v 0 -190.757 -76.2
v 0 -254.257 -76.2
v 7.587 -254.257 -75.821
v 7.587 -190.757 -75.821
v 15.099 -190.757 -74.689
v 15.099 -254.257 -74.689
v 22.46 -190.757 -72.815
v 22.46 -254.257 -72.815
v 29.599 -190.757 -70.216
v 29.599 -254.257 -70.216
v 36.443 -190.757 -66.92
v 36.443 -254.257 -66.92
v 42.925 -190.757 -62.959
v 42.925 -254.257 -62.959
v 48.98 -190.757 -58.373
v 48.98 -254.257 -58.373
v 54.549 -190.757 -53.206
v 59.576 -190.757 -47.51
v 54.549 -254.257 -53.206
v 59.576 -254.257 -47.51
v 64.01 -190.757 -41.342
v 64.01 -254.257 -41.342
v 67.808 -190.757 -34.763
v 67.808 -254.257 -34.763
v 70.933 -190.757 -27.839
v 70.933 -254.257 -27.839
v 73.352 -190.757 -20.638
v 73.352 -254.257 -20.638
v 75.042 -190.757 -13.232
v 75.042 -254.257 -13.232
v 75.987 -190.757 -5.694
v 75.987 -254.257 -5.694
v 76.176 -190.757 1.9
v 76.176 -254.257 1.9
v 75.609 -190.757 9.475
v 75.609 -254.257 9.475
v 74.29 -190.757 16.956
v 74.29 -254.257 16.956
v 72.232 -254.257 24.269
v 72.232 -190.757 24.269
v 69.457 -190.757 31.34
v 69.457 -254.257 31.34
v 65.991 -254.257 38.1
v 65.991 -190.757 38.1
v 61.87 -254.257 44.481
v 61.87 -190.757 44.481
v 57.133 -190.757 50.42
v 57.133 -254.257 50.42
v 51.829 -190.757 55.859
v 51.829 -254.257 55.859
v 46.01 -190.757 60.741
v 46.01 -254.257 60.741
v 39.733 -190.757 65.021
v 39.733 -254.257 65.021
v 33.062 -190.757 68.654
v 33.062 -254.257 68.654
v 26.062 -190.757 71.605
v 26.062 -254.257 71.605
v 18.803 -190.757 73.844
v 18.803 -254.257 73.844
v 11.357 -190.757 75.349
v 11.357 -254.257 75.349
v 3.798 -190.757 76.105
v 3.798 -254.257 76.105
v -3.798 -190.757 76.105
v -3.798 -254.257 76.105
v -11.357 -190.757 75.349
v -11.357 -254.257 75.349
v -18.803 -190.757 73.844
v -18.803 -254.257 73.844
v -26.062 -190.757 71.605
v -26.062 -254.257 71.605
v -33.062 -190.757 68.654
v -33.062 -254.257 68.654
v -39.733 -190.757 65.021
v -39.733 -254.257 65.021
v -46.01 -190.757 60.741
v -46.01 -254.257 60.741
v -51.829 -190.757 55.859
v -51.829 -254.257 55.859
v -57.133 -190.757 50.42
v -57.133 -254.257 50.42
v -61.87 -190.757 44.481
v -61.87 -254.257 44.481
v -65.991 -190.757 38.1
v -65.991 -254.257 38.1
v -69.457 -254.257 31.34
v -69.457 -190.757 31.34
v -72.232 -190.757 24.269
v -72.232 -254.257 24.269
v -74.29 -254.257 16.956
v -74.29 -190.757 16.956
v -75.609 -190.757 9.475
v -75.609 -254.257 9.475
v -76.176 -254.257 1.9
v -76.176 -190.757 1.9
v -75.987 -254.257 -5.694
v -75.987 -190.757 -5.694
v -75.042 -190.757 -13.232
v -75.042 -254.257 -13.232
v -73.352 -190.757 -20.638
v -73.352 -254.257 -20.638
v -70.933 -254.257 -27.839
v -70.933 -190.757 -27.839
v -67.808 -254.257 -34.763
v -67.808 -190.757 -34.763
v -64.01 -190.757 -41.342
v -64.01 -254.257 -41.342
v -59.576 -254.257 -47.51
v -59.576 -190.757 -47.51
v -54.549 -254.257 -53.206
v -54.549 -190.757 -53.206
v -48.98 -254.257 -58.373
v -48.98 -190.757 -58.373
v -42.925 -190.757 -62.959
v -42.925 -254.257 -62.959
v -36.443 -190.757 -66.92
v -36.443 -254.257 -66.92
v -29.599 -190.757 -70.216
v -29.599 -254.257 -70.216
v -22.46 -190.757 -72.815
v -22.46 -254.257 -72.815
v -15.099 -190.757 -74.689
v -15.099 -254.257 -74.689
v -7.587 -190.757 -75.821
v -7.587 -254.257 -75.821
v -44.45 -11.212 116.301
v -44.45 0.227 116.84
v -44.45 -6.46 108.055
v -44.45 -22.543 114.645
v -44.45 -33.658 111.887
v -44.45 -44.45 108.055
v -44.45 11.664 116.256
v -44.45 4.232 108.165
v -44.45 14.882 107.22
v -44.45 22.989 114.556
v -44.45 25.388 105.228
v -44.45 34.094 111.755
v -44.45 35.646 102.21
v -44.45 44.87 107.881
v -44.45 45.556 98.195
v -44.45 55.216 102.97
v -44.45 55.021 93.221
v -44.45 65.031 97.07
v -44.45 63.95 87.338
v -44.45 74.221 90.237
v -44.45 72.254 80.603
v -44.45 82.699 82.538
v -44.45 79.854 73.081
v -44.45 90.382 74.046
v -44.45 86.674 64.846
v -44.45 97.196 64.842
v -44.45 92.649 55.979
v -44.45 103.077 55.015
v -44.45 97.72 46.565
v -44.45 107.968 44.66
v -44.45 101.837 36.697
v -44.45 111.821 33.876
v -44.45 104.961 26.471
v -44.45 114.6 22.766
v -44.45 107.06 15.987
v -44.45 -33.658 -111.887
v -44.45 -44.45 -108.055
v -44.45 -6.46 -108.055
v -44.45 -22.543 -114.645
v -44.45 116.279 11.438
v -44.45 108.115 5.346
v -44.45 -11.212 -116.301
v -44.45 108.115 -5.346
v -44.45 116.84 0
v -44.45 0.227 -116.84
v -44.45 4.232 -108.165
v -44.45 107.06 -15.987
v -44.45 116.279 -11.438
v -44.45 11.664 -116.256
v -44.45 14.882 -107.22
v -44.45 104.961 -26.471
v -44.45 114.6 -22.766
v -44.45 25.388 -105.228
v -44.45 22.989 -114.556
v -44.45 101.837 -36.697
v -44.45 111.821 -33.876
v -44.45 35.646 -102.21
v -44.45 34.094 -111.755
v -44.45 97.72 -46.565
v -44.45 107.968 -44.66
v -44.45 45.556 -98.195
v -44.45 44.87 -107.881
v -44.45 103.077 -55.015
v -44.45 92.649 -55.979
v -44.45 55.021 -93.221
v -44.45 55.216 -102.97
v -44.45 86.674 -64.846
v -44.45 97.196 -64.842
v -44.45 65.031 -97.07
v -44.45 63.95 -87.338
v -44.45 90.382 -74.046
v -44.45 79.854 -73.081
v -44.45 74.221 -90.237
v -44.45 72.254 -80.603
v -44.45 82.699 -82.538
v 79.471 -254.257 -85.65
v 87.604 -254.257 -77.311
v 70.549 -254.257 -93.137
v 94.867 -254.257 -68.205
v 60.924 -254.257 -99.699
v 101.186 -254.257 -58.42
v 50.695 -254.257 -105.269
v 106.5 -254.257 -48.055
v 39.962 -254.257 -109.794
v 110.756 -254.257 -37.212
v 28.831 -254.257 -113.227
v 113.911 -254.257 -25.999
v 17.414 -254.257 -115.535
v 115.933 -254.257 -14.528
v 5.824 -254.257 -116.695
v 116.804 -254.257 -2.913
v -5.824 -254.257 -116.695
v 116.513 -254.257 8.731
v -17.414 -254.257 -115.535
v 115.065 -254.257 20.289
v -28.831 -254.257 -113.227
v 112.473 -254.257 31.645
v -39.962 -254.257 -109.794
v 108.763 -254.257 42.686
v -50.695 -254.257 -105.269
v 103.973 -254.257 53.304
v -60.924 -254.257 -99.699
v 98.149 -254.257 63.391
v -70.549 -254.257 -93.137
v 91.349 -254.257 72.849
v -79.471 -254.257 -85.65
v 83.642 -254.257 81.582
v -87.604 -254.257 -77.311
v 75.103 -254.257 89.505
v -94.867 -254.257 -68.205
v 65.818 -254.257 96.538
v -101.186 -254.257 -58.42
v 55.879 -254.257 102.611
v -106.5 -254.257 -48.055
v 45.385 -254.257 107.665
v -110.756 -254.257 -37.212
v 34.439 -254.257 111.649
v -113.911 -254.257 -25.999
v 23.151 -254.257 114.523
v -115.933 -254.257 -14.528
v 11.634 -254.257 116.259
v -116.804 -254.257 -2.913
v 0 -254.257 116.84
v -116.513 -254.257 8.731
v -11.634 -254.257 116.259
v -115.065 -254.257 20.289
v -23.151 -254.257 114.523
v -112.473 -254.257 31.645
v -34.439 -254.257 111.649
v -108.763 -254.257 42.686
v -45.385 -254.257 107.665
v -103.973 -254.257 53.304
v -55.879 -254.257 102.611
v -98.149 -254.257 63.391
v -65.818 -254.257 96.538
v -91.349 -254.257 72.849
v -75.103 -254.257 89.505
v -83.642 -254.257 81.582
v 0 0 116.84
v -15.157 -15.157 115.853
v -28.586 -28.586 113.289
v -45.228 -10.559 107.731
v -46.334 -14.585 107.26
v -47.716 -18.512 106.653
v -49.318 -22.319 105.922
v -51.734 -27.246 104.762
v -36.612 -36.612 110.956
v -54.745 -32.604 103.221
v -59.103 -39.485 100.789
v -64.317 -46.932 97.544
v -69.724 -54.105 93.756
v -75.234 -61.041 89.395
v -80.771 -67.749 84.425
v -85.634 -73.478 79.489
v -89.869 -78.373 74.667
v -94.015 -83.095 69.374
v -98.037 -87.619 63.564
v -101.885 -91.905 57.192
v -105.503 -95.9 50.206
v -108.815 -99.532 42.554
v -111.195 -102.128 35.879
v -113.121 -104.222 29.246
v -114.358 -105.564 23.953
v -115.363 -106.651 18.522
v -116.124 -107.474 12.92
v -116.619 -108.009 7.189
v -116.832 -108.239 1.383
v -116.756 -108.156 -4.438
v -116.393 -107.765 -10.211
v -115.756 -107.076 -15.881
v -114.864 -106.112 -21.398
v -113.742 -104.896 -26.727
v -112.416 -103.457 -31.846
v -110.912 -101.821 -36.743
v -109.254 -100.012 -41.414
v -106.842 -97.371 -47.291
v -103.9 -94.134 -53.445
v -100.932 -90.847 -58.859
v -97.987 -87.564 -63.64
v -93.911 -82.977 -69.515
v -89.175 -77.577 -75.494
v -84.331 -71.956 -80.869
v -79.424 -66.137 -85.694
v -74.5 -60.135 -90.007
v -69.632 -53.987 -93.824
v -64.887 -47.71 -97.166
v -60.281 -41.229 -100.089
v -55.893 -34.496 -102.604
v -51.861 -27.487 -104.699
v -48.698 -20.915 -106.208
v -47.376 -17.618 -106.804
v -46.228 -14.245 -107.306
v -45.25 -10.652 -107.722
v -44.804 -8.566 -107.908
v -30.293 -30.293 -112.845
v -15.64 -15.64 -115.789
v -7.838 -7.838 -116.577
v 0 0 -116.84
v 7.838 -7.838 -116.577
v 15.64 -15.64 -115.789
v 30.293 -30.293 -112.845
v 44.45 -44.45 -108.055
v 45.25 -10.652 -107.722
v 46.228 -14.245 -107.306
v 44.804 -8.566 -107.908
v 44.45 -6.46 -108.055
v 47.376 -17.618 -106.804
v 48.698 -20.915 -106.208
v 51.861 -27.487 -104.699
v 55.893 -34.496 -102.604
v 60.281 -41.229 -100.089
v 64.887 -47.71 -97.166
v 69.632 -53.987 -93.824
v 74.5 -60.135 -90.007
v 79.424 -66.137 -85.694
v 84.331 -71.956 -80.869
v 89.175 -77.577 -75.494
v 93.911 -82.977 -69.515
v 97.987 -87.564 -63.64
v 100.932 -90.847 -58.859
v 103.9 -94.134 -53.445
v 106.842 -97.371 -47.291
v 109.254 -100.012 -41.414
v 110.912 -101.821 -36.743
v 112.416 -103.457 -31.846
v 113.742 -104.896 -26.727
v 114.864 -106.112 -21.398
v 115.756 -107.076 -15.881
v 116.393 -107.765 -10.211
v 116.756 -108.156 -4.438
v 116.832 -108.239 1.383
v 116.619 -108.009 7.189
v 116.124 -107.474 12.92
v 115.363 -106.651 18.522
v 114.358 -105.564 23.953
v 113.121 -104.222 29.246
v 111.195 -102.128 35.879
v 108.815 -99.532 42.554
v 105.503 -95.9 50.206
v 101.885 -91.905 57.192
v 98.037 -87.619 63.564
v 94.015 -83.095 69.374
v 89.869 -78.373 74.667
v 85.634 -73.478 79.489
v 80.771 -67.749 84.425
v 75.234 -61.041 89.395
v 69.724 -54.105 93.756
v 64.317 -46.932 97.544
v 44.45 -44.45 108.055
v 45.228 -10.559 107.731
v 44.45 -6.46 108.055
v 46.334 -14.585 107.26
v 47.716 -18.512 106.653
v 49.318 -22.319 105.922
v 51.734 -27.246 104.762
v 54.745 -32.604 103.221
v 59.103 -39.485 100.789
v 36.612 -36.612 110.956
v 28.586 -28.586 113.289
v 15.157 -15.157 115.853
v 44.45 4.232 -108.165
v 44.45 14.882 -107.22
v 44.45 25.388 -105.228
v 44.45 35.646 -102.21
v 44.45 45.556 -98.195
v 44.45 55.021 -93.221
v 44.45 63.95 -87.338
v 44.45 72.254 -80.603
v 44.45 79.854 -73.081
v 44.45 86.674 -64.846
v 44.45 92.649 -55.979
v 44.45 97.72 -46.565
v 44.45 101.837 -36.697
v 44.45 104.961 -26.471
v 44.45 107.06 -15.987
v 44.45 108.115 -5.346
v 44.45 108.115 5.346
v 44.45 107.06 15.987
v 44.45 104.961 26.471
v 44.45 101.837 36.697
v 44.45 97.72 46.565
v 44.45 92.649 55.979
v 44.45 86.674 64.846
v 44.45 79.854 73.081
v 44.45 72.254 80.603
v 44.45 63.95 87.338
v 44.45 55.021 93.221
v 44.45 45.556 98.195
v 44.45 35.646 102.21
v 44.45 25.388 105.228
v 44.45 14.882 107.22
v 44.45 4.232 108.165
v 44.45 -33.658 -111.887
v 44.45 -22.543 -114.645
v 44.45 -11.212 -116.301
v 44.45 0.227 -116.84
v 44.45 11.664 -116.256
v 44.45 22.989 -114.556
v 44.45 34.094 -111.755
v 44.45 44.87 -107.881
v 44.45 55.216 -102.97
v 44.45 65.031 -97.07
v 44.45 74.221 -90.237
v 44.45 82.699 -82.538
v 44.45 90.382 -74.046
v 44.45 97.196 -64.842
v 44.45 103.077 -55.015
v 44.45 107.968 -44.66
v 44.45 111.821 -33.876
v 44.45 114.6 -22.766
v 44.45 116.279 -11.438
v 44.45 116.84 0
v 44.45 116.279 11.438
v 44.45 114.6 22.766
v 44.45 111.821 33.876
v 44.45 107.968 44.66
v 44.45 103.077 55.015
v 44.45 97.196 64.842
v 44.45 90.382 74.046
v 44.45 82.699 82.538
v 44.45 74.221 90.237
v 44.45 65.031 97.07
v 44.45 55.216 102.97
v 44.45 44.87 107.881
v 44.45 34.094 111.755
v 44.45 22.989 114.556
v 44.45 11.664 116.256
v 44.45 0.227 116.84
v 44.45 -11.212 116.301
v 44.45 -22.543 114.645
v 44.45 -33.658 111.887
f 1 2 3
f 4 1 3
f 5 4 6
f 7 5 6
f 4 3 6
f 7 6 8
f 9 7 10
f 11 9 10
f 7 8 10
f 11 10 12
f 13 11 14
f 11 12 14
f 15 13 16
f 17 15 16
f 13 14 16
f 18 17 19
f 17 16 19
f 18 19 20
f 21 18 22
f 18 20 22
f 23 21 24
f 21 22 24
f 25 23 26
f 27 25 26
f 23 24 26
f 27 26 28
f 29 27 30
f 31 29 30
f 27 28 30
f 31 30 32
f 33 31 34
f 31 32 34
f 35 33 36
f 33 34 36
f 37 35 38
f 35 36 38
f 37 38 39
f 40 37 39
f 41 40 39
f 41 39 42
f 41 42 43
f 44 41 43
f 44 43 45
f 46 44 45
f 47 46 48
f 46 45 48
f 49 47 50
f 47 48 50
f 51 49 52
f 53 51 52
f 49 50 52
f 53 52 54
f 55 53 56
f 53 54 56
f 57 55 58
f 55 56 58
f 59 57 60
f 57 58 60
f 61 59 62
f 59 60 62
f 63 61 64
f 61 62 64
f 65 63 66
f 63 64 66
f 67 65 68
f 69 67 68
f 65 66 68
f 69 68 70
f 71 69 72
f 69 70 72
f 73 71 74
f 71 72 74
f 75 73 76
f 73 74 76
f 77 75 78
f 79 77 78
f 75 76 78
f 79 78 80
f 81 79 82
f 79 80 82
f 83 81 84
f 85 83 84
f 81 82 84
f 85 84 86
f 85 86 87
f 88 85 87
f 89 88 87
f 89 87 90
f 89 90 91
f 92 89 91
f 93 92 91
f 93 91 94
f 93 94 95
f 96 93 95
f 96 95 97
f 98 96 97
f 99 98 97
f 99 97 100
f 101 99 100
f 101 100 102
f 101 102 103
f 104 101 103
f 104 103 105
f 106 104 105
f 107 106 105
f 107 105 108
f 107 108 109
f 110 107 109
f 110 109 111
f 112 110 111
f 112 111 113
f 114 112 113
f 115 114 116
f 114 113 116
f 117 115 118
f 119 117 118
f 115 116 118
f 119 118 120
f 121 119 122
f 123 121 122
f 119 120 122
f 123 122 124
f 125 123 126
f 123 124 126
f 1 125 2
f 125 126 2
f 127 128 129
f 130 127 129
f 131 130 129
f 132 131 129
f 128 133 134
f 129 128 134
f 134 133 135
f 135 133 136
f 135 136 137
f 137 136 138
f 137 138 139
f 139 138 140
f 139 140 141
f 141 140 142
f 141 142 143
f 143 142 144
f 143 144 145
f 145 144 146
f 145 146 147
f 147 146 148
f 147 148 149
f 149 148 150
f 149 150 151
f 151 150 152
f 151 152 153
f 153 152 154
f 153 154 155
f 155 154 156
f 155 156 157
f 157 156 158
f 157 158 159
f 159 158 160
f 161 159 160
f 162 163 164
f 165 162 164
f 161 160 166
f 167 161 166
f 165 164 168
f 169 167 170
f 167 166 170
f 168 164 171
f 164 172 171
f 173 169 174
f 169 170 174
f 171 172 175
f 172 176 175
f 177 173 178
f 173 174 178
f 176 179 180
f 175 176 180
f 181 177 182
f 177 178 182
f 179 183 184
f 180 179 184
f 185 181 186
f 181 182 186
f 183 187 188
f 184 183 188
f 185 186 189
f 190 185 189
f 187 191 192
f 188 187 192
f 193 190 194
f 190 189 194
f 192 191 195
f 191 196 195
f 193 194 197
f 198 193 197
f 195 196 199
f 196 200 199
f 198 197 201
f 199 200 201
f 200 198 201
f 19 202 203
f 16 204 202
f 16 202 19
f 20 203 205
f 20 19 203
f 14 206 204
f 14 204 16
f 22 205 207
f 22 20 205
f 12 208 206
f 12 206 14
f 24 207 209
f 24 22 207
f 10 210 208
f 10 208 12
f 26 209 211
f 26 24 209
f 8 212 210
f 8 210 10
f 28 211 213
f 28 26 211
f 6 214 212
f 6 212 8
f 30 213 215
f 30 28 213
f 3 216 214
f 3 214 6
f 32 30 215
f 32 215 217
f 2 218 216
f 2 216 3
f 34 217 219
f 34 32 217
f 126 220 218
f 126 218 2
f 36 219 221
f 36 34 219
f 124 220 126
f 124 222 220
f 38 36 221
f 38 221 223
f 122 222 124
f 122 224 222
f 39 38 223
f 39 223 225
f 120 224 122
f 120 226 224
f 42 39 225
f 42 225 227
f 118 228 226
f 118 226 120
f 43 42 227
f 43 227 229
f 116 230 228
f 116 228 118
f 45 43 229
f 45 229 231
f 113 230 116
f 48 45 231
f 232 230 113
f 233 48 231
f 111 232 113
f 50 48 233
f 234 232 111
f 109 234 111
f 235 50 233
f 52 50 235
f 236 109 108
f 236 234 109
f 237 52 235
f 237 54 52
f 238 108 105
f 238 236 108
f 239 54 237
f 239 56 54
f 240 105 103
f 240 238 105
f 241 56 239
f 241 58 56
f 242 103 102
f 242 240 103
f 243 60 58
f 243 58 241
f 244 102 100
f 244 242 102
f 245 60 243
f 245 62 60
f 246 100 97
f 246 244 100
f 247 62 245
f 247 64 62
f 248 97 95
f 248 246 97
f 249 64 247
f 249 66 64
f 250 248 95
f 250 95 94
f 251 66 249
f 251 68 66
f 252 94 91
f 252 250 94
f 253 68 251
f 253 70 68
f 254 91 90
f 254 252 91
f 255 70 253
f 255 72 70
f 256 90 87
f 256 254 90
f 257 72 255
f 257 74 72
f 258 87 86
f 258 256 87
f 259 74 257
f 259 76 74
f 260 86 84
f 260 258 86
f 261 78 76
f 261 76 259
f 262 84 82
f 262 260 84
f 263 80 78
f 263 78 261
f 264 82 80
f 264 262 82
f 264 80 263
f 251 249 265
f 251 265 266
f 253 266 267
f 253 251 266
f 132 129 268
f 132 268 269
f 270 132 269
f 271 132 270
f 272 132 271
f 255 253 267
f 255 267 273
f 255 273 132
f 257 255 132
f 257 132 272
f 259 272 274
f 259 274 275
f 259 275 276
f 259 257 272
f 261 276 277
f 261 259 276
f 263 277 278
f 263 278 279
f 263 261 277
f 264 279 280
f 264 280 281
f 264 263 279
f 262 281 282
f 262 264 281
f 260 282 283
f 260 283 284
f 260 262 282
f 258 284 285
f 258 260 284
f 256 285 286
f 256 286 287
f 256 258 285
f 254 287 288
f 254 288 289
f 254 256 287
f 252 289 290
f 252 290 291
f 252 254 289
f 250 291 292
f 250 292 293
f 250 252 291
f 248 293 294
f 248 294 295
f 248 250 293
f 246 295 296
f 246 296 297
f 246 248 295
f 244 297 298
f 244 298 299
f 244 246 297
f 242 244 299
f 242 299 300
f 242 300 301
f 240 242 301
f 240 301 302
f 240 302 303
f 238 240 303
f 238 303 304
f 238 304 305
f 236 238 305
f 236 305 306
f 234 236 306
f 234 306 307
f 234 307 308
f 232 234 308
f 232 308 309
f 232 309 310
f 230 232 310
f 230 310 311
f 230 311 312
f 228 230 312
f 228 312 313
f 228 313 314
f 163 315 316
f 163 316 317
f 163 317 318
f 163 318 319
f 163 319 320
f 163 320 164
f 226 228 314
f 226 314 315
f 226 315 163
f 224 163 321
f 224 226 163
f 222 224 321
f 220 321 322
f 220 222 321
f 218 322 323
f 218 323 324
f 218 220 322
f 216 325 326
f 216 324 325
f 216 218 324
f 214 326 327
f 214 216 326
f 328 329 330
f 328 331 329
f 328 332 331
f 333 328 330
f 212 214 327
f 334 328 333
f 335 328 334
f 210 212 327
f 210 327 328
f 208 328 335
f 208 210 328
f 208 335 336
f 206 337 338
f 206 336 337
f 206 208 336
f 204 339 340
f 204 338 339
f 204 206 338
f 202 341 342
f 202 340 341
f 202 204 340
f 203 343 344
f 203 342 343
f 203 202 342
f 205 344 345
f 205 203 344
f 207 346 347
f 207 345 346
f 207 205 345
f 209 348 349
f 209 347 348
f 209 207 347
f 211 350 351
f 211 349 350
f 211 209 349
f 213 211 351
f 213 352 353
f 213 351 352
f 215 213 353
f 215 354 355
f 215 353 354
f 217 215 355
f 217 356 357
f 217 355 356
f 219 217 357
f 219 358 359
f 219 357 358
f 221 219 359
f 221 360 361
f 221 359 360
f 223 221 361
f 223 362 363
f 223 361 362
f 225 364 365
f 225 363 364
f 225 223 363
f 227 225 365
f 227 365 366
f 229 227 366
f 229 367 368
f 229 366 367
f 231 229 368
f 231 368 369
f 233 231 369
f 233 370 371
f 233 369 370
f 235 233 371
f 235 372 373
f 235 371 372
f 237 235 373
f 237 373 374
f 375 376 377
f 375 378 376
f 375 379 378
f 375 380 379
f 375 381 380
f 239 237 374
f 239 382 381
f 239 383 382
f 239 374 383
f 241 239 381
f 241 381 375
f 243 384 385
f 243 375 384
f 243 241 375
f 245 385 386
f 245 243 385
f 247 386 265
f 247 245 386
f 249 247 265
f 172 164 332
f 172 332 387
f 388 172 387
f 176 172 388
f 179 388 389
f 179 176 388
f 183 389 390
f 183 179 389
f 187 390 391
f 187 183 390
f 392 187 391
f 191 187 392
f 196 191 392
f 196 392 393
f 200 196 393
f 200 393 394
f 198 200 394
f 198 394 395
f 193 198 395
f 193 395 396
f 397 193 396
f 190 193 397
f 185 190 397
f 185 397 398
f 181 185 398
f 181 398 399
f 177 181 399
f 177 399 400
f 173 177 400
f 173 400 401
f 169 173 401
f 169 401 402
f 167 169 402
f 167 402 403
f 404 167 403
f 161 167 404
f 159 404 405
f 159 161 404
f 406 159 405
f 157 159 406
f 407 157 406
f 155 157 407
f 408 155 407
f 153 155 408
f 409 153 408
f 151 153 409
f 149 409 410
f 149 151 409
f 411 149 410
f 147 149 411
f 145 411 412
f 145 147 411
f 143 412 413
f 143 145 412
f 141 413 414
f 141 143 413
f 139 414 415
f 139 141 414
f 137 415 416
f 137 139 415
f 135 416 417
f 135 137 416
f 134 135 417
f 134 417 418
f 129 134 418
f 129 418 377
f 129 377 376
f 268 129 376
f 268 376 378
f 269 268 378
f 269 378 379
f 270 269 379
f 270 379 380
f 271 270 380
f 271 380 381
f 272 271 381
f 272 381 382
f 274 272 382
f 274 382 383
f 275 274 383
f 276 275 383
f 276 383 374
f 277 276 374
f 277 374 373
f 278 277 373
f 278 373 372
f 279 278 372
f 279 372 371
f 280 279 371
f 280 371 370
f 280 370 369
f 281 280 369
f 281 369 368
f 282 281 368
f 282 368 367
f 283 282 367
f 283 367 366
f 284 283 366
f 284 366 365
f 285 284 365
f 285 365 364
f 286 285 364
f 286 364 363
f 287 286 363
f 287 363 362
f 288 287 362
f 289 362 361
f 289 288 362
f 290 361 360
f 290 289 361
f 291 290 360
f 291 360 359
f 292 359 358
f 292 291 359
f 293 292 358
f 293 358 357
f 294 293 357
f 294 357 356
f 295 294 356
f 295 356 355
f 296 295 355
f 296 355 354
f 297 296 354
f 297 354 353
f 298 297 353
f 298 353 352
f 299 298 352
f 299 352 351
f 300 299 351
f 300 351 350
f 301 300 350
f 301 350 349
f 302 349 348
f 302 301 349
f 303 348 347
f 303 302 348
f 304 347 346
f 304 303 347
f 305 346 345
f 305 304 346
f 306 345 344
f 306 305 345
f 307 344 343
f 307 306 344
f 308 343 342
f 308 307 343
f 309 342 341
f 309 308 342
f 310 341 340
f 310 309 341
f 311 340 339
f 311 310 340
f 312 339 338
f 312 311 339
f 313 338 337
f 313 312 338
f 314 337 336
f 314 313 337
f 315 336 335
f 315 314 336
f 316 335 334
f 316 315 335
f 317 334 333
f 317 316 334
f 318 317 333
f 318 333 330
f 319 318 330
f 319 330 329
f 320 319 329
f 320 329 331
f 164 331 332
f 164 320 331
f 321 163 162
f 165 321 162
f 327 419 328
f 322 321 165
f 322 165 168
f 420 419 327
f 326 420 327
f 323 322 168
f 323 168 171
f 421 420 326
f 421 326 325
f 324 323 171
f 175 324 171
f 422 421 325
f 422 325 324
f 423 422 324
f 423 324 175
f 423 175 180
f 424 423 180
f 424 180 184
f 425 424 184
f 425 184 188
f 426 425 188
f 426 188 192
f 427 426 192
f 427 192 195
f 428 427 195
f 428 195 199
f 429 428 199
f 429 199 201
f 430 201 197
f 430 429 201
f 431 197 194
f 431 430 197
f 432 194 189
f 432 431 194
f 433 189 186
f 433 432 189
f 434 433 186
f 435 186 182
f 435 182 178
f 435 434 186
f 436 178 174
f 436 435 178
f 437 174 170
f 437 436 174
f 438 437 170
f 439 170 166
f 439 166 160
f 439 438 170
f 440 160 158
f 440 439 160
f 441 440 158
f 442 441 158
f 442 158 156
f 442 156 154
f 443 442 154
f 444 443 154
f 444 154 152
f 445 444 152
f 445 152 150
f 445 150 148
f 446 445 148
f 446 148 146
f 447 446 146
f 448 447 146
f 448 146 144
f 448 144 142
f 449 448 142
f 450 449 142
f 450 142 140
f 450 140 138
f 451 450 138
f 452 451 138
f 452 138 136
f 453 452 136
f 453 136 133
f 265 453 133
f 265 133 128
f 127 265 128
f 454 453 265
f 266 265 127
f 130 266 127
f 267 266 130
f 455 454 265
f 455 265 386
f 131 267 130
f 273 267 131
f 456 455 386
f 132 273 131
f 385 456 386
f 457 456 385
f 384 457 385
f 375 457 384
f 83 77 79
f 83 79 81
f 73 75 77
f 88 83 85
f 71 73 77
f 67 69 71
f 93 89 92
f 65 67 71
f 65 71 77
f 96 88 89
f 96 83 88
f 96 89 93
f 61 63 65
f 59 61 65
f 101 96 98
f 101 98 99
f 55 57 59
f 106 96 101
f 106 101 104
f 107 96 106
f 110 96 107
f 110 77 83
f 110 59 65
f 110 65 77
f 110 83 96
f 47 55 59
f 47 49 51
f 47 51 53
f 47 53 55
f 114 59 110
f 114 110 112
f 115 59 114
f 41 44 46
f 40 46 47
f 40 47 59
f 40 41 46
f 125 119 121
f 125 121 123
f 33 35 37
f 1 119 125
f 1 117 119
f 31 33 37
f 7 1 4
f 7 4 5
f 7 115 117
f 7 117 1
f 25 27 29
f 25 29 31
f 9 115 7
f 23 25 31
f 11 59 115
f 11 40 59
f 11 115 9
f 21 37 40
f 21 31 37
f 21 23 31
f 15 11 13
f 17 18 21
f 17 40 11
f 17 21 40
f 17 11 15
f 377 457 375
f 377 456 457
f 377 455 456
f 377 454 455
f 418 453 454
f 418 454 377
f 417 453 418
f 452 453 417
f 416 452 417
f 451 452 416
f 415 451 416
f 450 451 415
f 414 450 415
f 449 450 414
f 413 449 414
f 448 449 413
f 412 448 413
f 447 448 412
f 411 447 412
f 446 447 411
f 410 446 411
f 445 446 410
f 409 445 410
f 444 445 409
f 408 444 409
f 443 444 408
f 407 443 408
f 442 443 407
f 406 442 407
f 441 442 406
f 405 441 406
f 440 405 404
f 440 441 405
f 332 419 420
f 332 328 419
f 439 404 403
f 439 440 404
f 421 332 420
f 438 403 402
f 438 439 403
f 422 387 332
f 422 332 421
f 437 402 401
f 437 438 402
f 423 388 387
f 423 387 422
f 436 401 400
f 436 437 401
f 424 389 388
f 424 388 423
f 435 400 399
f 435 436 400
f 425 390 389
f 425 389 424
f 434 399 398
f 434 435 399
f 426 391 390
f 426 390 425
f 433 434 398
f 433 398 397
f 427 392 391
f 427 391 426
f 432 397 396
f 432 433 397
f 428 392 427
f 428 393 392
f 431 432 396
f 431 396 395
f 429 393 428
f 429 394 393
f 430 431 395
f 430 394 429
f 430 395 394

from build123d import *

# Parameters (mm, degrees)
SKETCH1_R               = 116.84
SKETCH1_R_2             = 107.95
BOSS_EXTRUDE1_DEPTH     = 44.45
CUT_EXTRUDE6_DEPTH      = 288.798
CUT_EXTRUDE6_DEPTH_BACK = 154.94
SKETCH14_R              = 108.247485137
SKETCH15_R              = 76.2
CUT_EXTRUDE7_DEPTH      = 63.5


with BuildPart() as part:
    # Sketch1 → Boss-Extrude1 (new, symmetric)
    with BuildSketch(Plane(origin=(0, 0, 0), x_dir=(0, 0, -1), z_dir=(1, 0, 0))):
        Circle(SKETCH1_R)
        Circle(SKETCH1_R_2, mode=Mode.SUBTRACT)
    extrude(amount=BOSS_EXTRUDE1_DEPTH, both=True)

    # Sketch13 → Revolve3 (revolve)
    with BuildSketch(Plane(origin=(0, 0, 0), x_dir=(0, 0, -1), z_dir=(1, 0, 0))):
        with BuildLine():
            Line((-116.84, 0), (-116.84, -254.257018714))
            Line((-116.84, -254.257018714), (0, -254.257018714))
            Line((0, -254.257018714), (0, -116.84))
            ThreePointArc((0, -116.84), (-82.618356314, -82.618356314), (-116.84, 0))
        make_face()
    revolve(axis=Axis((0, -116.84, 0), (0, -1, 0)))

    # Sketch14 → Cut-Extrude6 (cut, two sides: drawn at the far end of the back side and taken through both)
    with BuildSketch(Plane(origin=(0, 0, 0), x_dir=(0, 0, -1), z_dir=(1, 0, 0)).offset(-CUT_EXTRUDE6_DEPTH_BACK)):
        with Locations(Location((0, 0, 0), (0, 0, 356.57852909))):
            Circle(SKETCH14_R)
    extrude(amount=CUT_EXTRUDE6_DEPTH + CUT_EXTRUDE6_DEPTH_BACK, mode=Mode.SUBTRACT)

    # Sketch15 → Cut-Extrude7 (cut)
    with BuildSketch(Plane.XZ.offset(254.257018714)):
        with Locations(Location((0, 0, 0), (0, 0, 270))):
            Circle(SKETCH15_R)
    extrude(amount=-CUT_EXTRUDE7_DEPTH, mode=Mode.SUBTRACT)


solid = part.part
